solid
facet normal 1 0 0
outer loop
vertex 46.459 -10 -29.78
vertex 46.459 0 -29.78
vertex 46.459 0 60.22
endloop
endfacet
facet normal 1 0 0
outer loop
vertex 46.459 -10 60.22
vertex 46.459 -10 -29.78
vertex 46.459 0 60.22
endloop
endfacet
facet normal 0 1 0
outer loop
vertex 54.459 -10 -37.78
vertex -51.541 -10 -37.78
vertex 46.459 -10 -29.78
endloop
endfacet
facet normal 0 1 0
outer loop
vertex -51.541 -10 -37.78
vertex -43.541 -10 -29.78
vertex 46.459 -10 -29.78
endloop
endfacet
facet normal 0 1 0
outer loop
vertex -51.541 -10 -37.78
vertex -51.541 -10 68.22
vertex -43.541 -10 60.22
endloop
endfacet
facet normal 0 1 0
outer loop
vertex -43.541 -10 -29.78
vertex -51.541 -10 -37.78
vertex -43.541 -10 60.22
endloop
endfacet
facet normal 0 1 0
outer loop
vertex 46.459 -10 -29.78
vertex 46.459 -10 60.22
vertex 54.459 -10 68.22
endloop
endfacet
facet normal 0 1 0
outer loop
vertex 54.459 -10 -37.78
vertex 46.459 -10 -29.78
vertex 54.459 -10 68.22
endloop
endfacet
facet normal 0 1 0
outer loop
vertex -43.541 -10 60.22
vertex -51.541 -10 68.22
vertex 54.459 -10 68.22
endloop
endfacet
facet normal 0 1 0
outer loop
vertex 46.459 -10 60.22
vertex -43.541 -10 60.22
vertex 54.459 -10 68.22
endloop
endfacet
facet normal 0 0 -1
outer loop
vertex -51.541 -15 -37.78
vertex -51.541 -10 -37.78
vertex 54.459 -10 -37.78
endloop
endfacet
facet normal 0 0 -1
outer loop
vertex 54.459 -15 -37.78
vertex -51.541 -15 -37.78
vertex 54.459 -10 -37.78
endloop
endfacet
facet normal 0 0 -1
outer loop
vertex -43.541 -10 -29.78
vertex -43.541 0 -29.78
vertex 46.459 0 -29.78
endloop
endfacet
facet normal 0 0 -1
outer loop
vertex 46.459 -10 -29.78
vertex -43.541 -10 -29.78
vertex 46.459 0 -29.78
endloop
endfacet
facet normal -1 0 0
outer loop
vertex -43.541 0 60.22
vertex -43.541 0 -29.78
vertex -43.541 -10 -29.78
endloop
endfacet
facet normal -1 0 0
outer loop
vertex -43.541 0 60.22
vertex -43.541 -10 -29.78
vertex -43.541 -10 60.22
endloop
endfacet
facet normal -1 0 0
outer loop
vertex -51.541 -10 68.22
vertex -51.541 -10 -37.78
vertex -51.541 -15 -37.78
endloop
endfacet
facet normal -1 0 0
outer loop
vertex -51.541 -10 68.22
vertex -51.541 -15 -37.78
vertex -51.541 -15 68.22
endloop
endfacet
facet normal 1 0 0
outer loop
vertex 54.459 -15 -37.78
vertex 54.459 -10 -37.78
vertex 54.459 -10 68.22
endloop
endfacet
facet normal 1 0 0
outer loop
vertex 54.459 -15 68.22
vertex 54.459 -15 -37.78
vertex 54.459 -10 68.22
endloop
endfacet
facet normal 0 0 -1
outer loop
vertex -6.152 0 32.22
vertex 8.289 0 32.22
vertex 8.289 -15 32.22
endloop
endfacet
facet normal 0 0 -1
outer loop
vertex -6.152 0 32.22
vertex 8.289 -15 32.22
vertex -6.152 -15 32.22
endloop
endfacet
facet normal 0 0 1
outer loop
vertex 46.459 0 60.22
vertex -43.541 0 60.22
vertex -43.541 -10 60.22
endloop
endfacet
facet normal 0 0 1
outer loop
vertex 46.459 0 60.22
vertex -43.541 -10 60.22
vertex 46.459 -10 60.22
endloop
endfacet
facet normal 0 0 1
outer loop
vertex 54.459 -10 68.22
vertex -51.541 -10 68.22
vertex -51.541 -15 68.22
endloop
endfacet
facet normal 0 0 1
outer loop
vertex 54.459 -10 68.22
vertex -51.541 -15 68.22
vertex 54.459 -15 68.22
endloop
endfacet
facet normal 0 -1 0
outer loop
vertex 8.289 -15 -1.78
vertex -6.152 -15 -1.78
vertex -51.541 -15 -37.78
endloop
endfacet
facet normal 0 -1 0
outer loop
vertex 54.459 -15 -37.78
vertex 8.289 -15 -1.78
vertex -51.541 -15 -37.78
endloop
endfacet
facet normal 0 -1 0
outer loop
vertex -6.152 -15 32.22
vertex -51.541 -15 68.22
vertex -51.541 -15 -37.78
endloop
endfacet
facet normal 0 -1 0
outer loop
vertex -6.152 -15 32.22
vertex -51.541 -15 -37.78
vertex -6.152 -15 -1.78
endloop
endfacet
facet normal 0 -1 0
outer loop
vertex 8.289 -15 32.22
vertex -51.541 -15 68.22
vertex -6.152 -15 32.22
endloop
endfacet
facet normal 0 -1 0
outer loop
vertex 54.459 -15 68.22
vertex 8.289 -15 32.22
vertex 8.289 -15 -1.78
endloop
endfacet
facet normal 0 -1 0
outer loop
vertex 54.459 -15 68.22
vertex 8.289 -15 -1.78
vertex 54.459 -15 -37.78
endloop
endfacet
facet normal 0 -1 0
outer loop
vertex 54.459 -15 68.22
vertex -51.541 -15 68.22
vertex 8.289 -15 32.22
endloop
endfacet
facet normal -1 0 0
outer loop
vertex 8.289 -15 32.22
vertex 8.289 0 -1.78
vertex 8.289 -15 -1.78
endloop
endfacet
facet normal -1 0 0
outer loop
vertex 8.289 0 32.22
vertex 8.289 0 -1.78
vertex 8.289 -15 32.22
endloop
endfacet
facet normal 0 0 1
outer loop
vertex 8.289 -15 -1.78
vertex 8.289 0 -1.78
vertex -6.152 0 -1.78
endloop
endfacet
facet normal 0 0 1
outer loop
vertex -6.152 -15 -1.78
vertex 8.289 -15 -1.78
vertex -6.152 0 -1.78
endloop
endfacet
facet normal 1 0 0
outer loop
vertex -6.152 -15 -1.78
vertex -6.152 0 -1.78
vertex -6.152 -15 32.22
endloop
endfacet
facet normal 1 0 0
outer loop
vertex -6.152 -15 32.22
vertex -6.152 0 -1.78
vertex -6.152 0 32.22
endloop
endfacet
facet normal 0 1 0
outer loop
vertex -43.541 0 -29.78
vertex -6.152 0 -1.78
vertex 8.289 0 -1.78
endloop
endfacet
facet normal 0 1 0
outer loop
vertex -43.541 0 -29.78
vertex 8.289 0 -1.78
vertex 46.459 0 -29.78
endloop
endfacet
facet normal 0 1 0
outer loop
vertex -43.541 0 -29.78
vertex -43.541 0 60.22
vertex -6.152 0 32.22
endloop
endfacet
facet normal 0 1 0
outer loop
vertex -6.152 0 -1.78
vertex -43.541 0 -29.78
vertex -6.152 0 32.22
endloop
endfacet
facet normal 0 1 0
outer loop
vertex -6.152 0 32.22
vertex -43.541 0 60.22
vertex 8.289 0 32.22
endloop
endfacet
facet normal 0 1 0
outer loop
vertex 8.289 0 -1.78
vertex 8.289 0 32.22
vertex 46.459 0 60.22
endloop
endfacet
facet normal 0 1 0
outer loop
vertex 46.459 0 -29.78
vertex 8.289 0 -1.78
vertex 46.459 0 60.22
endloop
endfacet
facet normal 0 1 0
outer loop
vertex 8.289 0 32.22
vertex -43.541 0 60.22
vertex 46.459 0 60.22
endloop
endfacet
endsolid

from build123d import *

# Parameters (mm, degrees)
F0_W     = 106
F0_H     = 106
F0_W_2   = 90
F0_H_2   = 90
F1_DEPTH = 15
F2_DEPTH = 10
F3_W     = 14.440985
F3_H     = 34
F4_DEPTH = 25


with BuildPart() as f1:
    # F0 (on Front) → F1 (new body)
    with BuildSketch(Plane.XZ):
        with Locations((1.458907, 15.220348)):
            Rectangle(F0_W, F0_H)
        with Locations((1.458907, 15.220348)):
            Rectangle(F0_W_2, F0_H_2, mode=Mode.SUBTRACT)
        with Locations((1.458907, 15.220348)):
            Rectangle(F0_W_2, F0_H_2)
    extrude(amount=F1_DEPTH)

    # F0 (on Front) → F2 (cut)
    with BuildSketch(Plane.XZ):
        with Locations((1.458907, 15.220348)):
            Rectangle(F0_W, F0_H)
        with Locations((1.458907, 15.220348)):
            Rectangle(F0_W_2, F0_H_2, mode=Mode.SUBTRACT)
    extrude(amount=F2_DEPTH, mode=Mode.SUBTRACT)

    # F3 (on face) → F4 (cut)
    with BuildSketch(Plane(origin=(0, 0, 0), x_dir=(-1, 0, 0), z_dir=(0, 1, 0))):
        with Locations((-1.06852, 15.220348)):
            Rectangle(F3_W, F3_H)
    extrude(amount=-F4_DEPTH, mode=Mode.SUBTRACT)


solid = f1.part
